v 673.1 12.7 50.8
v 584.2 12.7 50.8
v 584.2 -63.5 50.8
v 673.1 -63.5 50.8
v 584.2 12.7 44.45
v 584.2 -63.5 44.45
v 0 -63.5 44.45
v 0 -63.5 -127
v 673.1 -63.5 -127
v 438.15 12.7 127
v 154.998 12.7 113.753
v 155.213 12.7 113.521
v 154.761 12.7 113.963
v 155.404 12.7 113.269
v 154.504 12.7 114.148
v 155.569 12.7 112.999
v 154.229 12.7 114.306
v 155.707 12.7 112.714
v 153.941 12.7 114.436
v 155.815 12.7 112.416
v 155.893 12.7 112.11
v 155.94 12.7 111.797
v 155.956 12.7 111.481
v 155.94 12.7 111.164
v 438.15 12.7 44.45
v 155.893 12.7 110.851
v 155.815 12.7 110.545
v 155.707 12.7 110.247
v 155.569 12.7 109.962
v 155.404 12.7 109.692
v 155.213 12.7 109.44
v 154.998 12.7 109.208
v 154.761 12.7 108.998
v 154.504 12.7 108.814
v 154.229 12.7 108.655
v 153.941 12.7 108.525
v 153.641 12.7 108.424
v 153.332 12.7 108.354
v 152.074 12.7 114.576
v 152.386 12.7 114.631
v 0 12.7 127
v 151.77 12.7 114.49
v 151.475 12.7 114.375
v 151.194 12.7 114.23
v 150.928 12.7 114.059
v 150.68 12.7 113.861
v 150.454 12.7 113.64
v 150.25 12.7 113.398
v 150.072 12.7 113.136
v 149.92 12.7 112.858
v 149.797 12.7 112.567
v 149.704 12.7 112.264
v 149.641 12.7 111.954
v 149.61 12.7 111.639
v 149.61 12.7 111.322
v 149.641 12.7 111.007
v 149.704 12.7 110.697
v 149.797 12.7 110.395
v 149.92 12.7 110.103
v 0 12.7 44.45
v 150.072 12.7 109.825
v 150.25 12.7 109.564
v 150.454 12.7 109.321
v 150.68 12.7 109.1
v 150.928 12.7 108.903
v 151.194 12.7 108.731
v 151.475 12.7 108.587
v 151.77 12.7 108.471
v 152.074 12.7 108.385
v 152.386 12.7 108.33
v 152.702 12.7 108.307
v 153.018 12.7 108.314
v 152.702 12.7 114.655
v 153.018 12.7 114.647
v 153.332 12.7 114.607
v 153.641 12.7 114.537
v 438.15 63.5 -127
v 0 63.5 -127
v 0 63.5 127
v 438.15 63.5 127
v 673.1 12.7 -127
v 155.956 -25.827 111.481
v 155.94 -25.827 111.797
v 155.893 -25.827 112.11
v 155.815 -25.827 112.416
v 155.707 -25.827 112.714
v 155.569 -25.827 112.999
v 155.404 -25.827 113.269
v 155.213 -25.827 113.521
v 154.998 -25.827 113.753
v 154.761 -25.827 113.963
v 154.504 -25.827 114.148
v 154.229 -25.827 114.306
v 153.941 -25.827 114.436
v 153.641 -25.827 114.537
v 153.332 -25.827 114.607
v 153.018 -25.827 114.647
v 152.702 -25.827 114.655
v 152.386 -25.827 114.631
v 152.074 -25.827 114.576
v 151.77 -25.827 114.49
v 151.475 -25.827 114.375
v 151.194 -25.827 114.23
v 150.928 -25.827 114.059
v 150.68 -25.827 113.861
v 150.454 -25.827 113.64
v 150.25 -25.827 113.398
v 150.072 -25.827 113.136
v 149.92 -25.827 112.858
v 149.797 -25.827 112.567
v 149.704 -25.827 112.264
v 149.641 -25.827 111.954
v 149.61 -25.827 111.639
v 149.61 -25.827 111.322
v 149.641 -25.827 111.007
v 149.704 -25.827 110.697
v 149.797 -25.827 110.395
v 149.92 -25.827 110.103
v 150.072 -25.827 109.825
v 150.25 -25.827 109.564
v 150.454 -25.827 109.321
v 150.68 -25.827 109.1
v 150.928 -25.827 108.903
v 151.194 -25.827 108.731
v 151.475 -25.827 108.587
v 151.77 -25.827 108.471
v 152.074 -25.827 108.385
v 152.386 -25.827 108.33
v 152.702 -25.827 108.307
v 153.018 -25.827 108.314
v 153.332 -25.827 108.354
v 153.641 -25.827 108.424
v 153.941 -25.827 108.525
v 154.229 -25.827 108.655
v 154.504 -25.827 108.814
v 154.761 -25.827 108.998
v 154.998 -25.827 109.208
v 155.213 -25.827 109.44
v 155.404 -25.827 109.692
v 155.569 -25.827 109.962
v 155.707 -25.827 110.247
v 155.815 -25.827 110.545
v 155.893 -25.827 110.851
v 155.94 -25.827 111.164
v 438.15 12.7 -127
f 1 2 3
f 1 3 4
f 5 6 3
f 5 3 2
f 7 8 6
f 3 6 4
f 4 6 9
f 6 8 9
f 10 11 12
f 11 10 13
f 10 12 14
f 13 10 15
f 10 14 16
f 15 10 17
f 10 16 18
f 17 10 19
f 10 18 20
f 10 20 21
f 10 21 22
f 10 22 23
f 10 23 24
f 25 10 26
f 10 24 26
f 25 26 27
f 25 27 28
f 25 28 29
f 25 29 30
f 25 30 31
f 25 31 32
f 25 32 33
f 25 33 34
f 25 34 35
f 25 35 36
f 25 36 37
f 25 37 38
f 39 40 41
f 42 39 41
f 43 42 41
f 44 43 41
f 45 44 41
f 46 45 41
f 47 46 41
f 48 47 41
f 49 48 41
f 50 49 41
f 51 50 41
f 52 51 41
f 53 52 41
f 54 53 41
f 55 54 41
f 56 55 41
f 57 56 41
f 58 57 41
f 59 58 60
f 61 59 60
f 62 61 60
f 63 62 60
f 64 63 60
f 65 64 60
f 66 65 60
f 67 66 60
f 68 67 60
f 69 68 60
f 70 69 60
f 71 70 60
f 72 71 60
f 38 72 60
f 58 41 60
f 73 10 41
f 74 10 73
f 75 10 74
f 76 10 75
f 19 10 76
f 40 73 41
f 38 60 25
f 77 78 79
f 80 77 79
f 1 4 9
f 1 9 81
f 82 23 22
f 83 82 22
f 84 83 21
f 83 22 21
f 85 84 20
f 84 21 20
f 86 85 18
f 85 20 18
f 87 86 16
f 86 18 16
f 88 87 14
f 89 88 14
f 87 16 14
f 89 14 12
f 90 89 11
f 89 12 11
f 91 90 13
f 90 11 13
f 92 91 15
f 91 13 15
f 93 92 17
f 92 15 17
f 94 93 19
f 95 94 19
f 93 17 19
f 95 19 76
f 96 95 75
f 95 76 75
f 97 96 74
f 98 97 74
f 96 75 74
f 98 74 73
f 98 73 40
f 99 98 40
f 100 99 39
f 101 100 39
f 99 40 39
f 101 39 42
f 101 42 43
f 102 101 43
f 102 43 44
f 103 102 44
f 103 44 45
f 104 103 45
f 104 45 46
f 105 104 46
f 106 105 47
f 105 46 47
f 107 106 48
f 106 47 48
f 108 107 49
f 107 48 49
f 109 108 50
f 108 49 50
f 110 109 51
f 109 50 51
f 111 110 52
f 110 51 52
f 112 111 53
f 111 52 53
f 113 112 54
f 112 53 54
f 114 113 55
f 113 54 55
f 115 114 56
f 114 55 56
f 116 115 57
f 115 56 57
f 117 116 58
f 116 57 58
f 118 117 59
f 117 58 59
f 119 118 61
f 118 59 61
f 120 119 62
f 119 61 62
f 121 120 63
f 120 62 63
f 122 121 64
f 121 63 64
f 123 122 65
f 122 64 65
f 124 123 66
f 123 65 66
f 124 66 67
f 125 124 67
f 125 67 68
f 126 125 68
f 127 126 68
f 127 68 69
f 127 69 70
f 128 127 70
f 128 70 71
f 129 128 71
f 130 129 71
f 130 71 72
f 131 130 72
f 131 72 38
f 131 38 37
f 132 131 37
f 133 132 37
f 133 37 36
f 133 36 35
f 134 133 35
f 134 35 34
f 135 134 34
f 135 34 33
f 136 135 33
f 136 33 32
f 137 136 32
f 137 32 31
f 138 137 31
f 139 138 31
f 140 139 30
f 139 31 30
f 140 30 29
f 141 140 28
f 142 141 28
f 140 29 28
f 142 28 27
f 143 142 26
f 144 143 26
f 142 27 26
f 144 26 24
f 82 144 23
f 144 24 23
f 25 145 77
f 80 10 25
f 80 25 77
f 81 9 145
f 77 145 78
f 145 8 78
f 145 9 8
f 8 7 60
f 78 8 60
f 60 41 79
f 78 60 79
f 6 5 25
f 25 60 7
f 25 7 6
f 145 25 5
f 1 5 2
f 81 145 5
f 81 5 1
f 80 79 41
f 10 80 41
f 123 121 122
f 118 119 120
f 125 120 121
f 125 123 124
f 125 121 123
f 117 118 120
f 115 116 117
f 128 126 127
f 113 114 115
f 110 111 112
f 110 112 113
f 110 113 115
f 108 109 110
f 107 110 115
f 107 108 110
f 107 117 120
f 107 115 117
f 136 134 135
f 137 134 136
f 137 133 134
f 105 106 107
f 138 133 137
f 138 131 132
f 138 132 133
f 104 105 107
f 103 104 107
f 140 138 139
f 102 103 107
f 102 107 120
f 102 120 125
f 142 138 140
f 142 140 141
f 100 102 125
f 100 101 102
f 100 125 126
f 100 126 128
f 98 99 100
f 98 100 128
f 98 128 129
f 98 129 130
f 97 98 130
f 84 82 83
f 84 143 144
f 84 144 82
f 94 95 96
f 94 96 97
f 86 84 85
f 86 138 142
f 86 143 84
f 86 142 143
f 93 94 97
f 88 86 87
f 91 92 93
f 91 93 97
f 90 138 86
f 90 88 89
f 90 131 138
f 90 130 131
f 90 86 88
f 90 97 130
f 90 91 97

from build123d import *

# Parameters (mm, degrees)
F1_DEPTH = 673.1
F2_W     = 234.95
F2_H     = 50.8
F3_DEPTH = 254.001
F4_W     = 88.9
F4_H     = 76.2
F5_DEPTH = 6.35
F6_R     = 3.175
F7_DEPTH = 38.52672


with BuildPart() as f1:
    # F0 (on Right) → F1 (new body)
    with BuildSketch(Plane.YZ):
        Polygon((-63.5, 44.45), (-63.5, -127), (63.5, -127), (63.5, 127), (12.7, 127), (12.7, 44.45), align=None)
    extrude(amount=F1_DEPTH)

    # F2 (on face) → F3 (cut, through all)
    with BuildSketch(Plane.XY.offset(127)):
        with Locations((555.625, 38.1)):
            Rectangle(F2_W, F2_H)
    extrude(amount=-F3_DEPTH, mode=Mode.SUBTRACT)

    # F4 (on face) → F5 (join)
    with BuildSketch(Plane.XY.offset(44.45)):
        with Locations((628.65, -25.4)):
            Rectangle(F4_W, F4_H)
    extrude(amount=F5_DEPTH)

    # F6 (on face) → F7 (join)
    with BuildSketch(Plane.XZ.offset(-12.7)):
        with Locations((152.781, 111.4806)):
            Circle(F6_R)
    extrude(amount=F7_DEPTH)


solid = f1.part
